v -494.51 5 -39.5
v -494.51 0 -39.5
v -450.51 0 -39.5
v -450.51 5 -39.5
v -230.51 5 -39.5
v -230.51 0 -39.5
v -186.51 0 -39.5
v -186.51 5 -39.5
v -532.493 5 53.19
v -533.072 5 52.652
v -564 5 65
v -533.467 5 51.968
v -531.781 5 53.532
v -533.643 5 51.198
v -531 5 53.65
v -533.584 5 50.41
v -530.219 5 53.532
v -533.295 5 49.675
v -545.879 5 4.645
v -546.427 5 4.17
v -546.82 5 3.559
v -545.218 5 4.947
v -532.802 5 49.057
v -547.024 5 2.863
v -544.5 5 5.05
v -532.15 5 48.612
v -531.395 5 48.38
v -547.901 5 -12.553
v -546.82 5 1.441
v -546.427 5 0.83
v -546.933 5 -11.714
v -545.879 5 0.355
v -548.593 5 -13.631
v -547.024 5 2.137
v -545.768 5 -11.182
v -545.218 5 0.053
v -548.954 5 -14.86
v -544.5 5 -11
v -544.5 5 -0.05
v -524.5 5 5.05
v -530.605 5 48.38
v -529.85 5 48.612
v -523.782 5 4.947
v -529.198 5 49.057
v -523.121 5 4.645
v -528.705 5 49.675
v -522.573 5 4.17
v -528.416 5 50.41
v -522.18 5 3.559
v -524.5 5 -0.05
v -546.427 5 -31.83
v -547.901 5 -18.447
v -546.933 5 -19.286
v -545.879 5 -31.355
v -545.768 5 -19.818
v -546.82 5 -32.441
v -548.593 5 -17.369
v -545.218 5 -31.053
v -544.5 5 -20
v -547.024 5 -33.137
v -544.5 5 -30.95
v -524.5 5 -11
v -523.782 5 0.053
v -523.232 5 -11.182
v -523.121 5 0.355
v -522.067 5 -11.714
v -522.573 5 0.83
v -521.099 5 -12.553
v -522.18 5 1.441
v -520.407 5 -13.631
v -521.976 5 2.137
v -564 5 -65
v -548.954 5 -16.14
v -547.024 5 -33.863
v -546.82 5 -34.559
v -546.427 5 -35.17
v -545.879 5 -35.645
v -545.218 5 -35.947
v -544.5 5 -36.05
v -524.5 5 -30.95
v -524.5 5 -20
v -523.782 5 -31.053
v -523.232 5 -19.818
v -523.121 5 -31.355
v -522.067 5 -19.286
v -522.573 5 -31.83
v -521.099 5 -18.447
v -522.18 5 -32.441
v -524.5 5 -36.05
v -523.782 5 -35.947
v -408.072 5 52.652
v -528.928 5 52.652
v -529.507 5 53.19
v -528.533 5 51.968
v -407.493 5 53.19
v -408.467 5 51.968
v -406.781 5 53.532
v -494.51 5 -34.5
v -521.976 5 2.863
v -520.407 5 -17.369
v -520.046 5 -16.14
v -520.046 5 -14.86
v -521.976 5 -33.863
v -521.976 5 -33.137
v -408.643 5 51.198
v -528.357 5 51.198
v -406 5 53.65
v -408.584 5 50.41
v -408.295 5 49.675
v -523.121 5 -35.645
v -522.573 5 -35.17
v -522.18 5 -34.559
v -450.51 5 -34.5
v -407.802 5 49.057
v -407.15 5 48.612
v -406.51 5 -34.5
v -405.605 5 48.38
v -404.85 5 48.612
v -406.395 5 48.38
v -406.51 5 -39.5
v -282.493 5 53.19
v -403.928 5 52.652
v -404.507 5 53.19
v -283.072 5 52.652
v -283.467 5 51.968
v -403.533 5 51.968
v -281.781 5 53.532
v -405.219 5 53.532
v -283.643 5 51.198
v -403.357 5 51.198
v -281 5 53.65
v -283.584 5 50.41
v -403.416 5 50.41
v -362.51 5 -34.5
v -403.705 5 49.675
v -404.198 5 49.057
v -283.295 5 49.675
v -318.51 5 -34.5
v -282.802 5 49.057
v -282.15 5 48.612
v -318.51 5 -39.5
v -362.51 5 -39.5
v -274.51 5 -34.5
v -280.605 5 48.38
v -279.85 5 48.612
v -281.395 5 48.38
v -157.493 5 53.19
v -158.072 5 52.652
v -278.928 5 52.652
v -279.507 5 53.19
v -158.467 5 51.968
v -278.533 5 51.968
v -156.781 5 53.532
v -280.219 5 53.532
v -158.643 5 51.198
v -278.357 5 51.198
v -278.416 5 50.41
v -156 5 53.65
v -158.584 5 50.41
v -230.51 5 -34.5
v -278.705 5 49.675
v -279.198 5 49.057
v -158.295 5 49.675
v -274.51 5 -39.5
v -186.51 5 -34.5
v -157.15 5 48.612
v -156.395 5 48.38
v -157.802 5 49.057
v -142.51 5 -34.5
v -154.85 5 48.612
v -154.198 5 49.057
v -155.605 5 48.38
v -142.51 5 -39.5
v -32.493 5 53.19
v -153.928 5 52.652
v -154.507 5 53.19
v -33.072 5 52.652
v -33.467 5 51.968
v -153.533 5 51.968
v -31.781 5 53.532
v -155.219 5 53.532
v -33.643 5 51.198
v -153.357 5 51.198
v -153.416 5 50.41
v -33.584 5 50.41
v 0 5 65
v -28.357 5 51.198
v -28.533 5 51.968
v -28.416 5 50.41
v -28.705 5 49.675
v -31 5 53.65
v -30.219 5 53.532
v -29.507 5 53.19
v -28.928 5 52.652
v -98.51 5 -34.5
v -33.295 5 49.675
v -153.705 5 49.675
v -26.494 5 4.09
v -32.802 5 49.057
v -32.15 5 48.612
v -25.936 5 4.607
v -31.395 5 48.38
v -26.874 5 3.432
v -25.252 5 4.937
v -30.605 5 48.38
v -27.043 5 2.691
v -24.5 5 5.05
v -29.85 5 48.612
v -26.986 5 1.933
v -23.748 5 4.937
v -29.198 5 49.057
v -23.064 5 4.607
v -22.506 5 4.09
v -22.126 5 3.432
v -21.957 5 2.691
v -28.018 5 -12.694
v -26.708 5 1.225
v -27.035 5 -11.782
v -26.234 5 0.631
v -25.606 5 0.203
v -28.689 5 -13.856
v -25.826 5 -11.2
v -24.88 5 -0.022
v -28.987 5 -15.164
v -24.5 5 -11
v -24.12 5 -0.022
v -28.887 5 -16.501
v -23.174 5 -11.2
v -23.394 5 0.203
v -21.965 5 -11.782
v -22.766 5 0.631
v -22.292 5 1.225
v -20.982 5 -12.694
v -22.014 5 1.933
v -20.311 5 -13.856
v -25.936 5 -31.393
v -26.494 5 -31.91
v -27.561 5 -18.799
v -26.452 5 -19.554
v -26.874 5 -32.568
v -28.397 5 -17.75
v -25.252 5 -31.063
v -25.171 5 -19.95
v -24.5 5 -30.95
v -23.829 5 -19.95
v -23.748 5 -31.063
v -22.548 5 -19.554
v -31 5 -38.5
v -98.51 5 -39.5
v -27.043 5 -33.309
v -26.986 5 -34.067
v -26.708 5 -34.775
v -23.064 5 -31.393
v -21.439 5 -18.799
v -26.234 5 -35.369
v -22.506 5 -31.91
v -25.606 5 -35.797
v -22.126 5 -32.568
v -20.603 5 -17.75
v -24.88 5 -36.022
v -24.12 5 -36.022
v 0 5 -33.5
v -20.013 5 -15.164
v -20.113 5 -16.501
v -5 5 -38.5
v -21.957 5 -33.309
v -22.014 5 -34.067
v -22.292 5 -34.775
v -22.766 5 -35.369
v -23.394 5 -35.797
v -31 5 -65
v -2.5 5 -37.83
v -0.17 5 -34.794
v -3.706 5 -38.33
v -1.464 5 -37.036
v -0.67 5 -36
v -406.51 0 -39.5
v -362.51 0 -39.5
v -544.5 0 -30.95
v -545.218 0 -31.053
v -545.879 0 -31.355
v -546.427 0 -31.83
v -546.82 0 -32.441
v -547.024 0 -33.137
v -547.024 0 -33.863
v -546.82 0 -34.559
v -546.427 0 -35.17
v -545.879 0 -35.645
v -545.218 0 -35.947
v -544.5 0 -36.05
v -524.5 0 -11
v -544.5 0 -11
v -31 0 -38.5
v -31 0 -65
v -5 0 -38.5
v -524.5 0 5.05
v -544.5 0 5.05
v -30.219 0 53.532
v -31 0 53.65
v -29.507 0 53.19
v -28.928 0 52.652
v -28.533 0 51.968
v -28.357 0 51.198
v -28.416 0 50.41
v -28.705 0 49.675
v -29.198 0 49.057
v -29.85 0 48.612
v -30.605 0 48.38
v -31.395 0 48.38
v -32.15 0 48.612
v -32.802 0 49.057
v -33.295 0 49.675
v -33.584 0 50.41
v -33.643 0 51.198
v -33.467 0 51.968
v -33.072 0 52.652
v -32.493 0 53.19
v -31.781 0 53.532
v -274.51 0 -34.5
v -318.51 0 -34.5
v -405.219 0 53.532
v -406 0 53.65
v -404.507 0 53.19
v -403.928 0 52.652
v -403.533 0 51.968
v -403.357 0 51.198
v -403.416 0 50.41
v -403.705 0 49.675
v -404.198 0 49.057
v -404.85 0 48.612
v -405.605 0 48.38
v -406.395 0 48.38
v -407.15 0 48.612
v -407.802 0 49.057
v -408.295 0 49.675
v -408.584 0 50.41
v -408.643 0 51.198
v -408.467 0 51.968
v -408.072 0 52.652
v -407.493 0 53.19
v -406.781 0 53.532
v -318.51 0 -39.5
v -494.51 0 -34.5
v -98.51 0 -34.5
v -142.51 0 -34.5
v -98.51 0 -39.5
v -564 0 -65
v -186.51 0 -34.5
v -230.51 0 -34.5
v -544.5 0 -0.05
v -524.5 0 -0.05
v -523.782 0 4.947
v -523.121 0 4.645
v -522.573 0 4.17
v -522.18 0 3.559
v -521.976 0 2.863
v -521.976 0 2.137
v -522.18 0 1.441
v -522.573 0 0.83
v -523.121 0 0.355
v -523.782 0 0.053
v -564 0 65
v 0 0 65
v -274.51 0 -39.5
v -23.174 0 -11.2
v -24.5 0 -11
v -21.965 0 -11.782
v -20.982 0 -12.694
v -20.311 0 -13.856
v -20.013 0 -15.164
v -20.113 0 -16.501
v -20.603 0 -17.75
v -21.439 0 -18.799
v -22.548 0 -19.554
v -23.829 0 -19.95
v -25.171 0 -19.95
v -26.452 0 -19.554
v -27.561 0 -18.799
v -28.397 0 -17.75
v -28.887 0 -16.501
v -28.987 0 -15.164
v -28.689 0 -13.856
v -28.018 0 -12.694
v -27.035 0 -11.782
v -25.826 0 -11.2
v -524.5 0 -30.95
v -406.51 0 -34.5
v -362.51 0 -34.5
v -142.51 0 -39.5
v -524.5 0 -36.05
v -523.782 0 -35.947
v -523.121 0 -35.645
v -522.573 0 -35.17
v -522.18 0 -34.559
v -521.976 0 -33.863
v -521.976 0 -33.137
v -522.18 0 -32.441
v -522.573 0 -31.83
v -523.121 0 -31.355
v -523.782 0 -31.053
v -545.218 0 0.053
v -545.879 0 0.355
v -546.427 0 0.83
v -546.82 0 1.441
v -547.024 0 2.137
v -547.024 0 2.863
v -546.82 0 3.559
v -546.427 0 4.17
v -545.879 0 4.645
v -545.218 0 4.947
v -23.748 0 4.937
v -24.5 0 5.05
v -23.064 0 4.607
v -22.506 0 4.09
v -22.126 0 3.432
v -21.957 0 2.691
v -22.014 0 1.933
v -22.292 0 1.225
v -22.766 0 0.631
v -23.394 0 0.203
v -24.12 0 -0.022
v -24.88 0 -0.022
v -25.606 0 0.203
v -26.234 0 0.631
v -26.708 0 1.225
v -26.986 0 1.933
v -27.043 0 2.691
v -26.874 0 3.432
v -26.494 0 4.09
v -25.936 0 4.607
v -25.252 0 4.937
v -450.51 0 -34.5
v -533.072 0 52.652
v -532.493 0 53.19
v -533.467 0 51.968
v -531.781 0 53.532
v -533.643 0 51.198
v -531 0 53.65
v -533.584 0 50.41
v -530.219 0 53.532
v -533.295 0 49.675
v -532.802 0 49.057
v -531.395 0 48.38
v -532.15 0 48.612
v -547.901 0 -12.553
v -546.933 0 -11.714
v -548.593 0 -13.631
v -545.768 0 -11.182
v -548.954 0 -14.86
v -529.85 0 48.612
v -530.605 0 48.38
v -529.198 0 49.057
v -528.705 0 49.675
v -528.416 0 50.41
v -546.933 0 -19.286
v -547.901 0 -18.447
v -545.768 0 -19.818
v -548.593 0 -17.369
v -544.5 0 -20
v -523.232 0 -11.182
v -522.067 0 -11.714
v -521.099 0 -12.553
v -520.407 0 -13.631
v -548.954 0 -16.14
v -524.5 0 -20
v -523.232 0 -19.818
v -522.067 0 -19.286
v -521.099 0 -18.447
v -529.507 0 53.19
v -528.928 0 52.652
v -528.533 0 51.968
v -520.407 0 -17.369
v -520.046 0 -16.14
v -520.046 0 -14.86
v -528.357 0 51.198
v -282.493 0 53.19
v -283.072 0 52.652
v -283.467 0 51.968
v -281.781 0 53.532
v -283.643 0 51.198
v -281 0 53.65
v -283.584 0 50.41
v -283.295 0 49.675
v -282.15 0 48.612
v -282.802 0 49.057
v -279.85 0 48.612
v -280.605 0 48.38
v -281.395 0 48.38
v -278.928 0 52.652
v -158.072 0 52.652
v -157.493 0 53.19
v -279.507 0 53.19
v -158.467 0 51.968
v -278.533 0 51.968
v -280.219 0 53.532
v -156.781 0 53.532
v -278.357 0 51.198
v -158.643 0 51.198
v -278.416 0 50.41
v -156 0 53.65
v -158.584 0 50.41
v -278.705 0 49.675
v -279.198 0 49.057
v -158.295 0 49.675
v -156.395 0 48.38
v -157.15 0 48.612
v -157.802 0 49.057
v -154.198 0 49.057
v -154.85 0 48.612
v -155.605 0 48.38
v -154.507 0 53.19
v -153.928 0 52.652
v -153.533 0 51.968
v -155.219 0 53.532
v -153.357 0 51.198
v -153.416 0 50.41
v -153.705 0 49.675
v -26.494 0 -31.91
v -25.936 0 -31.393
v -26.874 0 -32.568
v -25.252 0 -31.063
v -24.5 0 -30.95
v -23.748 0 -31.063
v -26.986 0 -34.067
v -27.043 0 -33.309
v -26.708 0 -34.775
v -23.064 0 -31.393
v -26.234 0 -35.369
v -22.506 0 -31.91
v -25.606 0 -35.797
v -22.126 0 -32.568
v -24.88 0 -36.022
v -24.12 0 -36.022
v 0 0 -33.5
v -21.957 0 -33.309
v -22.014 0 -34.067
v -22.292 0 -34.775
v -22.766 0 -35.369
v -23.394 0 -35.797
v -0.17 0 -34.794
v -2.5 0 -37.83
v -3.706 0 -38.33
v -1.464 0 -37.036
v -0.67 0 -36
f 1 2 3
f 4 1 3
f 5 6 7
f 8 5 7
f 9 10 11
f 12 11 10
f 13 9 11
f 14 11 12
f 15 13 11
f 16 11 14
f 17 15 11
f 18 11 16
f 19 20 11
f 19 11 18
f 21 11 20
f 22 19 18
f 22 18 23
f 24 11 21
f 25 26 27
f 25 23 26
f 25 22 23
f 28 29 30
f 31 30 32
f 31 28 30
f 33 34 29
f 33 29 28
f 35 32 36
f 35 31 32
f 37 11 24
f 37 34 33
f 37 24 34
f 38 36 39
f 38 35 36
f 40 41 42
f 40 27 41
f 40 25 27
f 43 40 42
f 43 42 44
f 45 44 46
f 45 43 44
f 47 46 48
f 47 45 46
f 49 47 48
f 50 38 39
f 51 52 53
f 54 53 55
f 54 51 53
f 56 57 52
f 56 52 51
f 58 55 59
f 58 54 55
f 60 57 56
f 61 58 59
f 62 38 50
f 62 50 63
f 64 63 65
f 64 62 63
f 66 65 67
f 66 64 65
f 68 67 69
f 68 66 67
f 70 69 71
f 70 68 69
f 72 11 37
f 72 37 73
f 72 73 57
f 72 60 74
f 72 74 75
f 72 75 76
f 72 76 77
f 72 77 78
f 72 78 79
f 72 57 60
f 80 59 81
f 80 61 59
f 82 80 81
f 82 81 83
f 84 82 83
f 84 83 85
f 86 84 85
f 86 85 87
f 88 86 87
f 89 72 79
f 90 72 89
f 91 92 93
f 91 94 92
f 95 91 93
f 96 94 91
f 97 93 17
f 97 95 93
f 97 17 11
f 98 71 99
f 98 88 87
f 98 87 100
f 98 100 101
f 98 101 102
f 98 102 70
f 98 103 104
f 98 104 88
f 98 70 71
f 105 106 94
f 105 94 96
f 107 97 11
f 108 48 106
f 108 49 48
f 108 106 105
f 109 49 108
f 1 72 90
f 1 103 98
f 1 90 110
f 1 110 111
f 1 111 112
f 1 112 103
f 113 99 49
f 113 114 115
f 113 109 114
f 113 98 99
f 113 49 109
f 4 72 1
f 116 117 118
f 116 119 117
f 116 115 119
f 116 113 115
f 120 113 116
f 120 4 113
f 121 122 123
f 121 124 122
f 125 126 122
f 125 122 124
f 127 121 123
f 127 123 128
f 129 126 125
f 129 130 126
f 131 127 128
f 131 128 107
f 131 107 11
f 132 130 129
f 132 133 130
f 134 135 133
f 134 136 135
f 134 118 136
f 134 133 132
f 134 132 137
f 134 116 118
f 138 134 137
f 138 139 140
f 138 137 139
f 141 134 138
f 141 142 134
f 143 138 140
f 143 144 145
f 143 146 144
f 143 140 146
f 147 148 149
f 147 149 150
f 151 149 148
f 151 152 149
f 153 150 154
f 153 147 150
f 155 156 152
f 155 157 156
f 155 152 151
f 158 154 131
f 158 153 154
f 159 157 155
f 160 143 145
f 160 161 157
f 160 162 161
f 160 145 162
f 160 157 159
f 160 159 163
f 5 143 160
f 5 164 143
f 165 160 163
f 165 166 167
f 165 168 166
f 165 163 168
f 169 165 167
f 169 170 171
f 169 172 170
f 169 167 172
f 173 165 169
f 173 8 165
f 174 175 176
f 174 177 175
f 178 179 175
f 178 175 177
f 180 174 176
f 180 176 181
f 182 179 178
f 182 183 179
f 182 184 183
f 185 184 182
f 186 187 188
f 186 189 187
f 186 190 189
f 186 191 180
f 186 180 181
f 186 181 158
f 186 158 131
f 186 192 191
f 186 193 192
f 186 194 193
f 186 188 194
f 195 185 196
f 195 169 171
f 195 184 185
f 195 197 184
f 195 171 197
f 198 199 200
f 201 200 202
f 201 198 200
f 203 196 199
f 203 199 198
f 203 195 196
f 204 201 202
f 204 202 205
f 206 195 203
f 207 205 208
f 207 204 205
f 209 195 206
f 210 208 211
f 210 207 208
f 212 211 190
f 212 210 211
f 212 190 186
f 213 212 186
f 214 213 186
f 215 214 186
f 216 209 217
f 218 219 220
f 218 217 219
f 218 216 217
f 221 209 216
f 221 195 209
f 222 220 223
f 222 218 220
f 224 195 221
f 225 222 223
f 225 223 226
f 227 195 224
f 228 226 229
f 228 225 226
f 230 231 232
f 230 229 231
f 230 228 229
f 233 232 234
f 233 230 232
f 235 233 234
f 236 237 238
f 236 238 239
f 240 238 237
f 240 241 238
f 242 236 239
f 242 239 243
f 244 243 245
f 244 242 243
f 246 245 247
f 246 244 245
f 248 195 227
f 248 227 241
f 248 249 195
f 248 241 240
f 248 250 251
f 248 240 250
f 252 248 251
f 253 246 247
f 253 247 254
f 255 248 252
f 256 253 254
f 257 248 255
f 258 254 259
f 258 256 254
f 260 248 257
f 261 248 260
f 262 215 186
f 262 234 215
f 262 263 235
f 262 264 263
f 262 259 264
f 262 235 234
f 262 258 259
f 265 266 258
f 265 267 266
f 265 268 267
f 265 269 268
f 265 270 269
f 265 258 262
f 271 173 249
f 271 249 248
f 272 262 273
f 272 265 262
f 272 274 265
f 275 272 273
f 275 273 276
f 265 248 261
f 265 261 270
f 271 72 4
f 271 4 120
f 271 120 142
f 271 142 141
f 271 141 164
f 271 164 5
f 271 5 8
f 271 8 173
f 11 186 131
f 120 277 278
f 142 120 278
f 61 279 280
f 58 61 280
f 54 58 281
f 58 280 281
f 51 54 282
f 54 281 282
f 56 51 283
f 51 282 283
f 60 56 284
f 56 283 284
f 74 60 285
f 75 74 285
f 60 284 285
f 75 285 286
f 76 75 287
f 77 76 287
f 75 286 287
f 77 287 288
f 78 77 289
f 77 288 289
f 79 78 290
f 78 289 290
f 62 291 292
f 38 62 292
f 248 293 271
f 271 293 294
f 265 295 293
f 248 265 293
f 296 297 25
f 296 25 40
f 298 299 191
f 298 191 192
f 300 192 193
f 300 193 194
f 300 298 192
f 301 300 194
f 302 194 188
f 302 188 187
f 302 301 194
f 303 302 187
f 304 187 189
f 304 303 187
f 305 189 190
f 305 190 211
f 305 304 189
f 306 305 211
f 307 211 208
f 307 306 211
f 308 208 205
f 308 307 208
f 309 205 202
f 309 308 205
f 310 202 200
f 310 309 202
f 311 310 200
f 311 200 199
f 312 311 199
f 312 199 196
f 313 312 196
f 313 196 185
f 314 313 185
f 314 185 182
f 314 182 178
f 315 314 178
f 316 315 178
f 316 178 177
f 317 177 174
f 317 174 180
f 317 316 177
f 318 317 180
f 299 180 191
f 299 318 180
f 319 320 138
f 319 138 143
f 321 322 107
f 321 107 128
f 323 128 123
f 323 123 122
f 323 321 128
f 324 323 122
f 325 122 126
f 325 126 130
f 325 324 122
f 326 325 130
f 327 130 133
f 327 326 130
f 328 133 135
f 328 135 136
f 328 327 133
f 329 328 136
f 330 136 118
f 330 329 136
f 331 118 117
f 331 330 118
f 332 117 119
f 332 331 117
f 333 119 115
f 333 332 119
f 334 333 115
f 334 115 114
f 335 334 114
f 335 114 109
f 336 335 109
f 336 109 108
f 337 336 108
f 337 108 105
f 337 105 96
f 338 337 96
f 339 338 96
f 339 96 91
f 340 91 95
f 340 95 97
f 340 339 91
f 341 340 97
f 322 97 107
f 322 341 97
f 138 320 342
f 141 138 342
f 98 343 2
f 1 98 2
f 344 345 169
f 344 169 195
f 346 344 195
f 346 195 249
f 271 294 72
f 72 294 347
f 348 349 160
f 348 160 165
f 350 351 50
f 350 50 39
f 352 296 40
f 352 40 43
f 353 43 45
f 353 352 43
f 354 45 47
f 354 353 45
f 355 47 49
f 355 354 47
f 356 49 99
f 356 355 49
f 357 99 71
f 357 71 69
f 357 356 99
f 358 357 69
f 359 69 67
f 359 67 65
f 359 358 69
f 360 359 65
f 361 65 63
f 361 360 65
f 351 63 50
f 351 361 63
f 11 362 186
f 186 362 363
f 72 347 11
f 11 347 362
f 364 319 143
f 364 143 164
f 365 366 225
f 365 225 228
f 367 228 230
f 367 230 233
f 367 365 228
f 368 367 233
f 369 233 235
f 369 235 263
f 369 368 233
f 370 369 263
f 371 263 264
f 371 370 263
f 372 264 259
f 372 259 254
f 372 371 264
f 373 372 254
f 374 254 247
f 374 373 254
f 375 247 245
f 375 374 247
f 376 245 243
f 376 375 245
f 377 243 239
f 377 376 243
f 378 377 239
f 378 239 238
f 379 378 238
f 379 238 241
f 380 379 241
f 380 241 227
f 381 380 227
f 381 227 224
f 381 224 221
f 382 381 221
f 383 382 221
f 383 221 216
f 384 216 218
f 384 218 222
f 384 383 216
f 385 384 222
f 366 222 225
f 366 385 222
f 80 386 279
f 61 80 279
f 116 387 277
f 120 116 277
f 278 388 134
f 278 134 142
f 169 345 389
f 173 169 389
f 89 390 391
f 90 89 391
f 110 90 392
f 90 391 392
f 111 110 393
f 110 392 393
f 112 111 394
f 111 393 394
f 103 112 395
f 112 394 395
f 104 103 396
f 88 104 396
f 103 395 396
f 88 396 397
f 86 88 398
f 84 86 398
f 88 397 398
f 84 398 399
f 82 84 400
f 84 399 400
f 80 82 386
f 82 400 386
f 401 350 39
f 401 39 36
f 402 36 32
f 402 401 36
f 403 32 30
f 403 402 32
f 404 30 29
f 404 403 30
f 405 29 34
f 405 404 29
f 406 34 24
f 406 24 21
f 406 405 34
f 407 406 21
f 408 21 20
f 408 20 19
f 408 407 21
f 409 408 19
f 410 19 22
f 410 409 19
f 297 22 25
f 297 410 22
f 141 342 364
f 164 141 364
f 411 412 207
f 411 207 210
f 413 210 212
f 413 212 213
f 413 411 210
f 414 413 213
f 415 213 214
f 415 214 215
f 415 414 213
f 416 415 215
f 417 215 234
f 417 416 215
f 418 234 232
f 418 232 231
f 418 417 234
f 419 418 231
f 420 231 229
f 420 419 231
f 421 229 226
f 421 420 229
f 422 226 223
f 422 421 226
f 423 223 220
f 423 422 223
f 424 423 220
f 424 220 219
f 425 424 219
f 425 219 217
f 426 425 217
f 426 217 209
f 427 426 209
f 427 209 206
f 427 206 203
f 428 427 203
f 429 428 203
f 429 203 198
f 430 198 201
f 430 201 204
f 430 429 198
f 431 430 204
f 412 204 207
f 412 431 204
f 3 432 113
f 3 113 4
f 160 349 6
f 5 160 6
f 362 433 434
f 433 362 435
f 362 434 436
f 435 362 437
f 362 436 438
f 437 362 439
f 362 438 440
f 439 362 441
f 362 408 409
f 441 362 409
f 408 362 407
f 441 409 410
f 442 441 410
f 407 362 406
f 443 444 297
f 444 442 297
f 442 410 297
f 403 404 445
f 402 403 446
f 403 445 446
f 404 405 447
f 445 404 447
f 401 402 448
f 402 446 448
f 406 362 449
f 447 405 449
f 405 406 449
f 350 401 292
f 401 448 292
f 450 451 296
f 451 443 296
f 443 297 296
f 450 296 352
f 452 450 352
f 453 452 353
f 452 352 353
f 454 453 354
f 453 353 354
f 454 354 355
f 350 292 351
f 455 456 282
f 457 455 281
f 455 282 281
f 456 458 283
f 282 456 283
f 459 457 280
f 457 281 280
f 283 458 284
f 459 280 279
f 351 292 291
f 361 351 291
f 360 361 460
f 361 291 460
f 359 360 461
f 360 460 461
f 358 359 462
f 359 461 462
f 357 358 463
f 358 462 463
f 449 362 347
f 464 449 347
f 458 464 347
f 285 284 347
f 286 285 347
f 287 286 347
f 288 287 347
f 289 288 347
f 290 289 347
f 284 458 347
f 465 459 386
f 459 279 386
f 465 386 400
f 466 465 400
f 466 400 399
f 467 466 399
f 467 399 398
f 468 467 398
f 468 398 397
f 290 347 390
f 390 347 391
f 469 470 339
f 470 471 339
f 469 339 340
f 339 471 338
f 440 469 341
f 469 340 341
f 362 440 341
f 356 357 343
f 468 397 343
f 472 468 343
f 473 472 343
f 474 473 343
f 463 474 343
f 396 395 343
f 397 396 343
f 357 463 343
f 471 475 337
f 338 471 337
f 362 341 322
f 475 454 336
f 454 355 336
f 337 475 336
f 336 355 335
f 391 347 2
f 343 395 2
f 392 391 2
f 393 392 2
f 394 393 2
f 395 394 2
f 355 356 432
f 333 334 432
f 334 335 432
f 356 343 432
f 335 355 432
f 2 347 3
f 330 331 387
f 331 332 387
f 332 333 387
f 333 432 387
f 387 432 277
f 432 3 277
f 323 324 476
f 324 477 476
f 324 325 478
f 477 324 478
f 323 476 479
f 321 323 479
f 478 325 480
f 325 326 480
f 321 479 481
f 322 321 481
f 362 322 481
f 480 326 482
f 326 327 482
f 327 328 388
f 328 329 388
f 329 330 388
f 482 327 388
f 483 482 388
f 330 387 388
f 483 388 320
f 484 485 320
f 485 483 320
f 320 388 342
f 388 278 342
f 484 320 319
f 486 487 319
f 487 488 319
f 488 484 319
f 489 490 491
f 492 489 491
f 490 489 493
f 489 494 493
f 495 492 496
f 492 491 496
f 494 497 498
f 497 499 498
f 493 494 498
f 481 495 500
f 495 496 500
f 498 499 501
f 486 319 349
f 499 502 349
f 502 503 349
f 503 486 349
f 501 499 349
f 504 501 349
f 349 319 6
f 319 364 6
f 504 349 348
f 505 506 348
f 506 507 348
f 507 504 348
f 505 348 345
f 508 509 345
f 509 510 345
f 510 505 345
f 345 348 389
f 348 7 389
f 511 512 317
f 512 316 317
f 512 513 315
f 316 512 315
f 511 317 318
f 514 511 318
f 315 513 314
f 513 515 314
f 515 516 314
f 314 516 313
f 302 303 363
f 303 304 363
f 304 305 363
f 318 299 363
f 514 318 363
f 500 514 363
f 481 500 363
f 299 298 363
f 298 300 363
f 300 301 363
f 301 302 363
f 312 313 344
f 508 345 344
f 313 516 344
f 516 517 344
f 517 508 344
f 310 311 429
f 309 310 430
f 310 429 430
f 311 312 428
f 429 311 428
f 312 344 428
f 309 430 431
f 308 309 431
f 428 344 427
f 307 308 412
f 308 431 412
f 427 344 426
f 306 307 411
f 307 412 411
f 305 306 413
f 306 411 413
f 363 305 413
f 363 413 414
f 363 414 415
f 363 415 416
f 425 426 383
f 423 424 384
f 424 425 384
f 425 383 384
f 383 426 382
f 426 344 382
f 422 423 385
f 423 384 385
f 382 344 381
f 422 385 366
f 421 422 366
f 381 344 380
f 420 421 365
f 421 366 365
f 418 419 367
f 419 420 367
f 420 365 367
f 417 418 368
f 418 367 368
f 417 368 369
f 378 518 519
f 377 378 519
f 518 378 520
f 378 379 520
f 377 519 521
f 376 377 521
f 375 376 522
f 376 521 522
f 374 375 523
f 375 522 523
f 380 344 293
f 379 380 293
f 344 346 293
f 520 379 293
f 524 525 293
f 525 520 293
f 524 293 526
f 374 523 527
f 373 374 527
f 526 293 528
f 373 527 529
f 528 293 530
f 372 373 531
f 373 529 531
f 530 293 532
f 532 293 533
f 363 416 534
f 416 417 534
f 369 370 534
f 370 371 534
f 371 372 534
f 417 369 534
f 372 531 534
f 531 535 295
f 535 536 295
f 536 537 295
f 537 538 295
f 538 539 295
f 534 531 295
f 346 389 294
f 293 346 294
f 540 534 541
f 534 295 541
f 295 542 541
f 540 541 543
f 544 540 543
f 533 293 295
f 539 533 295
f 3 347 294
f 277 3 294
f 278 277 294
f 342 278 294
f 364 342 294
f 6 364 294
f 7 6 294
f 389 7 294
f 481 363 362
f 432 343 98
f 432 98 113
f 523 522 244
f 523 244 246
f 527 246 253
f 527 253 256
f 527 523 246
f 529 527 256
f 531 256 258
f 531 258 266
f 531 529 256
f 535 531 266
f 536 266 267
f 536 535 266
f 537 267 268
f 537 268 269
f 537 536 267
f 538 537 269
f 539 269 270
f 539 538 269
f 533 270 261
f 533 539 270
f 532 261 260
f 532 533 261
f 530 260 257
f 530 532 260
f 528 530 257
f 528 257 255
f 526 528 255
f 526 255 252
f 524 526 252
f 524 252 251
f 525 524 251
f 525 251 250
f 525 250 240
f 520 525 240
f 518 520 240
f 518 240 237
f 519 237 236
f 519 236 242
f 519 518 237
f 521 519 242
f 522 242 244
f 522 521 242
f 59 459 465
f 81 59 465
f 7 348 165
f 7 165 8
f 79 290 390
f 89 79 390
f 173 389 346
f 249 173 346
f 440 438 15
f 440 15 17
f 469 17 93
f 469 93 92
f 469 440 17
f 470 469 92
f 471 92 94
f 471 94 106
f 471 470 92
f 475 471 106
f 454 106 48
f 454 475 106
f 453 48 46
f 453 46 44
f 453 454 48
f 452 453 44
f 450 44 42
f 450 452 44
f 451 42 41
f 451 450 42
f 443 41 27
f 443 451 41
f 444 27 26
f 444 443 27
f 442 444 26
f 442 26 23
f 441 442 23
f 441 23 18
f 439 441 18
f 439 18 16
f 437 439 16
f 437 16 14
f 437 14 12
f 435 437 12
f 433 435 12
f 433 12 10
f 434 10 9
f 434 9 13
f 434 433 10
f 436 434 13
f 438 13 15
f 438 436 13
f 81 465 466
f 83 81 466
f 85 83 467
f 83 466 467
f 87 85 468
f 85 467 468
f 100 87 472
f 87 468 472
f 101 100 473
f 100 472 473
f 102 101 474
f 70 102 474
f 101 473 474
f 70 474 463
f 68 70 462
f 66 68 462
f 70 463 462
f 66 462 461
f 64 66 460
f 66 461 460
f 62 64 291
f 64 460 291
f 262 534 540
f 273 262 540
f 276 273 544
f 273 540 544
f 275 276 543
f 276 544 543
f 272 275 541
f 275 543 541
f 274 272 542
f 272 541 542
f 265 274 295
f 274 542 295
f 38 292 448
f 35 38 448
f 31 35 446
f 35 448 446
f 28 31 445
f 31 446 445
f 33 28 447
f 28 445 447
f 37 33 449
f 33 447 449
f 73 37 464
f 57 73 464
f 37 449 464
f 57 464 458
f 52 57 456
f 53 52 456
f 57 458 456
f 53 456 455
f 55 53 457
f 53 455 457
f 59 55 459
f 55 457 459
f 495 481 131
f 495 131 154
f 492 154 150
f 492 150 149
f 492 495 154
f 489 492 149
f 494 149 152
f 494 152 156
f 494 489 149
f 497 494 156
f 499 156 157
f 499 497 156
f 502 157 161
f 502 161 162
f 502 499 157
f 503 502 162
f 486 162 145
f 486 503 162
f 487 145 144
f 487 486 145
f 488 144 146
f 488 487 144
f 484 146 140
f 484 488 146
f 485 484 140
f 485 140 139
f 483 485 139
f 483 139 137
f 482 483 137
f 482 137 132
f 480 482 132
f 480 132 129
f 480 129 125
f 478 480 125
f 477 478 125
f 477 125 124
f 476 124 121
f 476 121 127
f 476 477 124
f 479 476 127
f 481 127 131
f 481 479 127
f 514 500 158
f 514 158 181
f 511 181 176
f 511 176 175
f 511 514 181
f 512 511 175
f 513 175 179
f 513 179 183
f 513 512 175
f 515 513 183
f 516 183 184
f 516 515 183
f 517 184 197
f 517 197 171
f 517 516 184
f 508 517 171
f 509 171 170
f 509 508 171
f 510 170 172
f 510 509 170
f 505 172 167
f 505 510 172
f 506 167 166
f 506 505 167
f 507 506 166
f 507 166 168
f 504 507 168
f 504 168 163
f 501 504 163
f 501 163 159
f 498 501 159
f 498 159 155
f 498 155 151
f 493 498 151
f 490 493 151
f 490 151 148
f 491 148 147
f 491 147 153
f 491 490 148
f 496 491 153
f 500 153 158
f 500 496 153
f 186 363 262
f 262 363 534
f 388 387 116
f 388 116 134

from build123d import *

# Parameters (mm, degrees)
SKETCH1_R           = 2.55
SKETCH1_R_2         = 4.5
SKETCH1_R_3         = 2.65
SKETCH1_W           = 44
SKETCH1_H           = 5
BOSS_EXTRUDE1_DEPTH = 5


with BuildPart() as part:
    # Sketch1 → Boss-Extrude1 (new body)
    with BuildSketch(Plane(origin=(0, 0, 0), x_dir=(1, 0, 0), z_dir=(0, 1, 0))):
        with BuildLine():
            Line((0, 0), (0, 33.5))
            ThreePointArc((0, 33.5), (-1.464466094, 37.035533906), (-5, 38.5))
            Line((-5, 38.5), (-31, 38.5))
            Line((-31, 38.5), (-31, 65))
            Line((-31, 65), (-564, 65))
            Line((-564, 65), (-564, -65))
            Line((-564, -65), (-524.5, -65))
            Line((-524.5, -65), (0, -65))
            Line((0, -65), (0, 0))
        make_face()
        with Locations(Location((-24.5, 33.5, 0), (0, 0, 270))):
            Circle(SKETCH1_R, mode=Mode.SUBTRACT)
        with Locations(Location((-24.5, -2.5, 0), (0, 0, 270))):
            Circle(SKETCH1_R, mode=Mode.SUBTRACT)
        with Locations(Location((-24.5, 15.5, 0), (0, 0, 270))):
            Circle(SKETCH1_R_2, mode=Mode.SUBTRACT)
        with Locations(Location((-531, -51, 0), (0, 0, 270))):
            Circle(SKETCH1_R_3, mode=Mode.SUBTRACT)
        with Locations(Location((-406, -51, 0), (0, 0, 270))):
            Circle(SKETCH1_R_3, mode=Mode.SUBTRACT)
        with Locations(Location((-281, -51, 0), (0, 0, 270))):
            Circle(SKETCH1_R_3, mode=Mode.SUBTRACT)
        with Locations(Location((-156, -51, 0), (0, 0, 270))):
            Circle(SKETCH1_R_3, mode=Mode.SUBTRACT)
        with Locations(Location((-31, -51, 0), (0, 0, 270))):
            Circle(SKETCH1_R_3, mode=Mode.SUBTRACT)
        with Locations((-472.510496642, 37)):
            Rectangle(SKETCH1_W, SKETCH1_H, mode=Mode.SUBTRACT)
        with Locations((-384.510496642, 37)):
            Rectangle(SKETCH1_W, SKETCH1_H, mode=Mode.SUBTRACT)
        with BuildLine():
            Line((-544.5, 36.05), (-524.5, 36.05))
            ThreePointArc((-524.5, 36.05), (-521.95, 33.5), (-524.5, 30.95))
            Line((-524.5, 30.95), (-544.5, 30.95))
            ThreePointArc((-544.5, 30.95), (-547.05, 33.5), (-544.5, 36.05))
        make_face(mode=Mode.SUBTRACT)
        with BuildLine():
            Line((-524.5, 0.05), (-544.5, 0.05))
            ThreePointArc((-544.5, 0.05), (-547.05, -2.5), (-544.5, -5.05))
            Line((-544.5, -5.05), (-524.5, -5.05))
            ThreePointArc((-524.5, -5.05), (-521.95, -2.5), (-524.5, 0.05))
        make_face(mode=Mode.SUBTRACT)
        with Locations((-296.510496642, 37)):
            Rectangle(SKETCH1_W, SKETCH1_H, mode=Mode.SUBTRACT)
        with BuildLine():
            Line((-544.5, 20), (-524.5, 20))
            ThreePointArc((-524.5, 20), (-520, 15.5), (-524.5, 11))
            Line((-524.5, 11), (-544.5, 11))
            ThreePointArc((-544.5, 11), (-549, 15.5), (-544.5, 20))
        make_face(mode=Mode.SUBTRACT)
        with Locations((-208.510496642, 37)):
            Rectangle(SKETCH1_W, SKETCH1_H, mode=Mode.SUBTRACT)
        with Locations((-120.510496642, 37)):
            Rectangle(SKETCH1_W, SKETCH1_H, mode=Mode.SUBTRACT)
    extrude(amount=BOSS_EXTRUDE1_DEPTH)


solid = part.part
